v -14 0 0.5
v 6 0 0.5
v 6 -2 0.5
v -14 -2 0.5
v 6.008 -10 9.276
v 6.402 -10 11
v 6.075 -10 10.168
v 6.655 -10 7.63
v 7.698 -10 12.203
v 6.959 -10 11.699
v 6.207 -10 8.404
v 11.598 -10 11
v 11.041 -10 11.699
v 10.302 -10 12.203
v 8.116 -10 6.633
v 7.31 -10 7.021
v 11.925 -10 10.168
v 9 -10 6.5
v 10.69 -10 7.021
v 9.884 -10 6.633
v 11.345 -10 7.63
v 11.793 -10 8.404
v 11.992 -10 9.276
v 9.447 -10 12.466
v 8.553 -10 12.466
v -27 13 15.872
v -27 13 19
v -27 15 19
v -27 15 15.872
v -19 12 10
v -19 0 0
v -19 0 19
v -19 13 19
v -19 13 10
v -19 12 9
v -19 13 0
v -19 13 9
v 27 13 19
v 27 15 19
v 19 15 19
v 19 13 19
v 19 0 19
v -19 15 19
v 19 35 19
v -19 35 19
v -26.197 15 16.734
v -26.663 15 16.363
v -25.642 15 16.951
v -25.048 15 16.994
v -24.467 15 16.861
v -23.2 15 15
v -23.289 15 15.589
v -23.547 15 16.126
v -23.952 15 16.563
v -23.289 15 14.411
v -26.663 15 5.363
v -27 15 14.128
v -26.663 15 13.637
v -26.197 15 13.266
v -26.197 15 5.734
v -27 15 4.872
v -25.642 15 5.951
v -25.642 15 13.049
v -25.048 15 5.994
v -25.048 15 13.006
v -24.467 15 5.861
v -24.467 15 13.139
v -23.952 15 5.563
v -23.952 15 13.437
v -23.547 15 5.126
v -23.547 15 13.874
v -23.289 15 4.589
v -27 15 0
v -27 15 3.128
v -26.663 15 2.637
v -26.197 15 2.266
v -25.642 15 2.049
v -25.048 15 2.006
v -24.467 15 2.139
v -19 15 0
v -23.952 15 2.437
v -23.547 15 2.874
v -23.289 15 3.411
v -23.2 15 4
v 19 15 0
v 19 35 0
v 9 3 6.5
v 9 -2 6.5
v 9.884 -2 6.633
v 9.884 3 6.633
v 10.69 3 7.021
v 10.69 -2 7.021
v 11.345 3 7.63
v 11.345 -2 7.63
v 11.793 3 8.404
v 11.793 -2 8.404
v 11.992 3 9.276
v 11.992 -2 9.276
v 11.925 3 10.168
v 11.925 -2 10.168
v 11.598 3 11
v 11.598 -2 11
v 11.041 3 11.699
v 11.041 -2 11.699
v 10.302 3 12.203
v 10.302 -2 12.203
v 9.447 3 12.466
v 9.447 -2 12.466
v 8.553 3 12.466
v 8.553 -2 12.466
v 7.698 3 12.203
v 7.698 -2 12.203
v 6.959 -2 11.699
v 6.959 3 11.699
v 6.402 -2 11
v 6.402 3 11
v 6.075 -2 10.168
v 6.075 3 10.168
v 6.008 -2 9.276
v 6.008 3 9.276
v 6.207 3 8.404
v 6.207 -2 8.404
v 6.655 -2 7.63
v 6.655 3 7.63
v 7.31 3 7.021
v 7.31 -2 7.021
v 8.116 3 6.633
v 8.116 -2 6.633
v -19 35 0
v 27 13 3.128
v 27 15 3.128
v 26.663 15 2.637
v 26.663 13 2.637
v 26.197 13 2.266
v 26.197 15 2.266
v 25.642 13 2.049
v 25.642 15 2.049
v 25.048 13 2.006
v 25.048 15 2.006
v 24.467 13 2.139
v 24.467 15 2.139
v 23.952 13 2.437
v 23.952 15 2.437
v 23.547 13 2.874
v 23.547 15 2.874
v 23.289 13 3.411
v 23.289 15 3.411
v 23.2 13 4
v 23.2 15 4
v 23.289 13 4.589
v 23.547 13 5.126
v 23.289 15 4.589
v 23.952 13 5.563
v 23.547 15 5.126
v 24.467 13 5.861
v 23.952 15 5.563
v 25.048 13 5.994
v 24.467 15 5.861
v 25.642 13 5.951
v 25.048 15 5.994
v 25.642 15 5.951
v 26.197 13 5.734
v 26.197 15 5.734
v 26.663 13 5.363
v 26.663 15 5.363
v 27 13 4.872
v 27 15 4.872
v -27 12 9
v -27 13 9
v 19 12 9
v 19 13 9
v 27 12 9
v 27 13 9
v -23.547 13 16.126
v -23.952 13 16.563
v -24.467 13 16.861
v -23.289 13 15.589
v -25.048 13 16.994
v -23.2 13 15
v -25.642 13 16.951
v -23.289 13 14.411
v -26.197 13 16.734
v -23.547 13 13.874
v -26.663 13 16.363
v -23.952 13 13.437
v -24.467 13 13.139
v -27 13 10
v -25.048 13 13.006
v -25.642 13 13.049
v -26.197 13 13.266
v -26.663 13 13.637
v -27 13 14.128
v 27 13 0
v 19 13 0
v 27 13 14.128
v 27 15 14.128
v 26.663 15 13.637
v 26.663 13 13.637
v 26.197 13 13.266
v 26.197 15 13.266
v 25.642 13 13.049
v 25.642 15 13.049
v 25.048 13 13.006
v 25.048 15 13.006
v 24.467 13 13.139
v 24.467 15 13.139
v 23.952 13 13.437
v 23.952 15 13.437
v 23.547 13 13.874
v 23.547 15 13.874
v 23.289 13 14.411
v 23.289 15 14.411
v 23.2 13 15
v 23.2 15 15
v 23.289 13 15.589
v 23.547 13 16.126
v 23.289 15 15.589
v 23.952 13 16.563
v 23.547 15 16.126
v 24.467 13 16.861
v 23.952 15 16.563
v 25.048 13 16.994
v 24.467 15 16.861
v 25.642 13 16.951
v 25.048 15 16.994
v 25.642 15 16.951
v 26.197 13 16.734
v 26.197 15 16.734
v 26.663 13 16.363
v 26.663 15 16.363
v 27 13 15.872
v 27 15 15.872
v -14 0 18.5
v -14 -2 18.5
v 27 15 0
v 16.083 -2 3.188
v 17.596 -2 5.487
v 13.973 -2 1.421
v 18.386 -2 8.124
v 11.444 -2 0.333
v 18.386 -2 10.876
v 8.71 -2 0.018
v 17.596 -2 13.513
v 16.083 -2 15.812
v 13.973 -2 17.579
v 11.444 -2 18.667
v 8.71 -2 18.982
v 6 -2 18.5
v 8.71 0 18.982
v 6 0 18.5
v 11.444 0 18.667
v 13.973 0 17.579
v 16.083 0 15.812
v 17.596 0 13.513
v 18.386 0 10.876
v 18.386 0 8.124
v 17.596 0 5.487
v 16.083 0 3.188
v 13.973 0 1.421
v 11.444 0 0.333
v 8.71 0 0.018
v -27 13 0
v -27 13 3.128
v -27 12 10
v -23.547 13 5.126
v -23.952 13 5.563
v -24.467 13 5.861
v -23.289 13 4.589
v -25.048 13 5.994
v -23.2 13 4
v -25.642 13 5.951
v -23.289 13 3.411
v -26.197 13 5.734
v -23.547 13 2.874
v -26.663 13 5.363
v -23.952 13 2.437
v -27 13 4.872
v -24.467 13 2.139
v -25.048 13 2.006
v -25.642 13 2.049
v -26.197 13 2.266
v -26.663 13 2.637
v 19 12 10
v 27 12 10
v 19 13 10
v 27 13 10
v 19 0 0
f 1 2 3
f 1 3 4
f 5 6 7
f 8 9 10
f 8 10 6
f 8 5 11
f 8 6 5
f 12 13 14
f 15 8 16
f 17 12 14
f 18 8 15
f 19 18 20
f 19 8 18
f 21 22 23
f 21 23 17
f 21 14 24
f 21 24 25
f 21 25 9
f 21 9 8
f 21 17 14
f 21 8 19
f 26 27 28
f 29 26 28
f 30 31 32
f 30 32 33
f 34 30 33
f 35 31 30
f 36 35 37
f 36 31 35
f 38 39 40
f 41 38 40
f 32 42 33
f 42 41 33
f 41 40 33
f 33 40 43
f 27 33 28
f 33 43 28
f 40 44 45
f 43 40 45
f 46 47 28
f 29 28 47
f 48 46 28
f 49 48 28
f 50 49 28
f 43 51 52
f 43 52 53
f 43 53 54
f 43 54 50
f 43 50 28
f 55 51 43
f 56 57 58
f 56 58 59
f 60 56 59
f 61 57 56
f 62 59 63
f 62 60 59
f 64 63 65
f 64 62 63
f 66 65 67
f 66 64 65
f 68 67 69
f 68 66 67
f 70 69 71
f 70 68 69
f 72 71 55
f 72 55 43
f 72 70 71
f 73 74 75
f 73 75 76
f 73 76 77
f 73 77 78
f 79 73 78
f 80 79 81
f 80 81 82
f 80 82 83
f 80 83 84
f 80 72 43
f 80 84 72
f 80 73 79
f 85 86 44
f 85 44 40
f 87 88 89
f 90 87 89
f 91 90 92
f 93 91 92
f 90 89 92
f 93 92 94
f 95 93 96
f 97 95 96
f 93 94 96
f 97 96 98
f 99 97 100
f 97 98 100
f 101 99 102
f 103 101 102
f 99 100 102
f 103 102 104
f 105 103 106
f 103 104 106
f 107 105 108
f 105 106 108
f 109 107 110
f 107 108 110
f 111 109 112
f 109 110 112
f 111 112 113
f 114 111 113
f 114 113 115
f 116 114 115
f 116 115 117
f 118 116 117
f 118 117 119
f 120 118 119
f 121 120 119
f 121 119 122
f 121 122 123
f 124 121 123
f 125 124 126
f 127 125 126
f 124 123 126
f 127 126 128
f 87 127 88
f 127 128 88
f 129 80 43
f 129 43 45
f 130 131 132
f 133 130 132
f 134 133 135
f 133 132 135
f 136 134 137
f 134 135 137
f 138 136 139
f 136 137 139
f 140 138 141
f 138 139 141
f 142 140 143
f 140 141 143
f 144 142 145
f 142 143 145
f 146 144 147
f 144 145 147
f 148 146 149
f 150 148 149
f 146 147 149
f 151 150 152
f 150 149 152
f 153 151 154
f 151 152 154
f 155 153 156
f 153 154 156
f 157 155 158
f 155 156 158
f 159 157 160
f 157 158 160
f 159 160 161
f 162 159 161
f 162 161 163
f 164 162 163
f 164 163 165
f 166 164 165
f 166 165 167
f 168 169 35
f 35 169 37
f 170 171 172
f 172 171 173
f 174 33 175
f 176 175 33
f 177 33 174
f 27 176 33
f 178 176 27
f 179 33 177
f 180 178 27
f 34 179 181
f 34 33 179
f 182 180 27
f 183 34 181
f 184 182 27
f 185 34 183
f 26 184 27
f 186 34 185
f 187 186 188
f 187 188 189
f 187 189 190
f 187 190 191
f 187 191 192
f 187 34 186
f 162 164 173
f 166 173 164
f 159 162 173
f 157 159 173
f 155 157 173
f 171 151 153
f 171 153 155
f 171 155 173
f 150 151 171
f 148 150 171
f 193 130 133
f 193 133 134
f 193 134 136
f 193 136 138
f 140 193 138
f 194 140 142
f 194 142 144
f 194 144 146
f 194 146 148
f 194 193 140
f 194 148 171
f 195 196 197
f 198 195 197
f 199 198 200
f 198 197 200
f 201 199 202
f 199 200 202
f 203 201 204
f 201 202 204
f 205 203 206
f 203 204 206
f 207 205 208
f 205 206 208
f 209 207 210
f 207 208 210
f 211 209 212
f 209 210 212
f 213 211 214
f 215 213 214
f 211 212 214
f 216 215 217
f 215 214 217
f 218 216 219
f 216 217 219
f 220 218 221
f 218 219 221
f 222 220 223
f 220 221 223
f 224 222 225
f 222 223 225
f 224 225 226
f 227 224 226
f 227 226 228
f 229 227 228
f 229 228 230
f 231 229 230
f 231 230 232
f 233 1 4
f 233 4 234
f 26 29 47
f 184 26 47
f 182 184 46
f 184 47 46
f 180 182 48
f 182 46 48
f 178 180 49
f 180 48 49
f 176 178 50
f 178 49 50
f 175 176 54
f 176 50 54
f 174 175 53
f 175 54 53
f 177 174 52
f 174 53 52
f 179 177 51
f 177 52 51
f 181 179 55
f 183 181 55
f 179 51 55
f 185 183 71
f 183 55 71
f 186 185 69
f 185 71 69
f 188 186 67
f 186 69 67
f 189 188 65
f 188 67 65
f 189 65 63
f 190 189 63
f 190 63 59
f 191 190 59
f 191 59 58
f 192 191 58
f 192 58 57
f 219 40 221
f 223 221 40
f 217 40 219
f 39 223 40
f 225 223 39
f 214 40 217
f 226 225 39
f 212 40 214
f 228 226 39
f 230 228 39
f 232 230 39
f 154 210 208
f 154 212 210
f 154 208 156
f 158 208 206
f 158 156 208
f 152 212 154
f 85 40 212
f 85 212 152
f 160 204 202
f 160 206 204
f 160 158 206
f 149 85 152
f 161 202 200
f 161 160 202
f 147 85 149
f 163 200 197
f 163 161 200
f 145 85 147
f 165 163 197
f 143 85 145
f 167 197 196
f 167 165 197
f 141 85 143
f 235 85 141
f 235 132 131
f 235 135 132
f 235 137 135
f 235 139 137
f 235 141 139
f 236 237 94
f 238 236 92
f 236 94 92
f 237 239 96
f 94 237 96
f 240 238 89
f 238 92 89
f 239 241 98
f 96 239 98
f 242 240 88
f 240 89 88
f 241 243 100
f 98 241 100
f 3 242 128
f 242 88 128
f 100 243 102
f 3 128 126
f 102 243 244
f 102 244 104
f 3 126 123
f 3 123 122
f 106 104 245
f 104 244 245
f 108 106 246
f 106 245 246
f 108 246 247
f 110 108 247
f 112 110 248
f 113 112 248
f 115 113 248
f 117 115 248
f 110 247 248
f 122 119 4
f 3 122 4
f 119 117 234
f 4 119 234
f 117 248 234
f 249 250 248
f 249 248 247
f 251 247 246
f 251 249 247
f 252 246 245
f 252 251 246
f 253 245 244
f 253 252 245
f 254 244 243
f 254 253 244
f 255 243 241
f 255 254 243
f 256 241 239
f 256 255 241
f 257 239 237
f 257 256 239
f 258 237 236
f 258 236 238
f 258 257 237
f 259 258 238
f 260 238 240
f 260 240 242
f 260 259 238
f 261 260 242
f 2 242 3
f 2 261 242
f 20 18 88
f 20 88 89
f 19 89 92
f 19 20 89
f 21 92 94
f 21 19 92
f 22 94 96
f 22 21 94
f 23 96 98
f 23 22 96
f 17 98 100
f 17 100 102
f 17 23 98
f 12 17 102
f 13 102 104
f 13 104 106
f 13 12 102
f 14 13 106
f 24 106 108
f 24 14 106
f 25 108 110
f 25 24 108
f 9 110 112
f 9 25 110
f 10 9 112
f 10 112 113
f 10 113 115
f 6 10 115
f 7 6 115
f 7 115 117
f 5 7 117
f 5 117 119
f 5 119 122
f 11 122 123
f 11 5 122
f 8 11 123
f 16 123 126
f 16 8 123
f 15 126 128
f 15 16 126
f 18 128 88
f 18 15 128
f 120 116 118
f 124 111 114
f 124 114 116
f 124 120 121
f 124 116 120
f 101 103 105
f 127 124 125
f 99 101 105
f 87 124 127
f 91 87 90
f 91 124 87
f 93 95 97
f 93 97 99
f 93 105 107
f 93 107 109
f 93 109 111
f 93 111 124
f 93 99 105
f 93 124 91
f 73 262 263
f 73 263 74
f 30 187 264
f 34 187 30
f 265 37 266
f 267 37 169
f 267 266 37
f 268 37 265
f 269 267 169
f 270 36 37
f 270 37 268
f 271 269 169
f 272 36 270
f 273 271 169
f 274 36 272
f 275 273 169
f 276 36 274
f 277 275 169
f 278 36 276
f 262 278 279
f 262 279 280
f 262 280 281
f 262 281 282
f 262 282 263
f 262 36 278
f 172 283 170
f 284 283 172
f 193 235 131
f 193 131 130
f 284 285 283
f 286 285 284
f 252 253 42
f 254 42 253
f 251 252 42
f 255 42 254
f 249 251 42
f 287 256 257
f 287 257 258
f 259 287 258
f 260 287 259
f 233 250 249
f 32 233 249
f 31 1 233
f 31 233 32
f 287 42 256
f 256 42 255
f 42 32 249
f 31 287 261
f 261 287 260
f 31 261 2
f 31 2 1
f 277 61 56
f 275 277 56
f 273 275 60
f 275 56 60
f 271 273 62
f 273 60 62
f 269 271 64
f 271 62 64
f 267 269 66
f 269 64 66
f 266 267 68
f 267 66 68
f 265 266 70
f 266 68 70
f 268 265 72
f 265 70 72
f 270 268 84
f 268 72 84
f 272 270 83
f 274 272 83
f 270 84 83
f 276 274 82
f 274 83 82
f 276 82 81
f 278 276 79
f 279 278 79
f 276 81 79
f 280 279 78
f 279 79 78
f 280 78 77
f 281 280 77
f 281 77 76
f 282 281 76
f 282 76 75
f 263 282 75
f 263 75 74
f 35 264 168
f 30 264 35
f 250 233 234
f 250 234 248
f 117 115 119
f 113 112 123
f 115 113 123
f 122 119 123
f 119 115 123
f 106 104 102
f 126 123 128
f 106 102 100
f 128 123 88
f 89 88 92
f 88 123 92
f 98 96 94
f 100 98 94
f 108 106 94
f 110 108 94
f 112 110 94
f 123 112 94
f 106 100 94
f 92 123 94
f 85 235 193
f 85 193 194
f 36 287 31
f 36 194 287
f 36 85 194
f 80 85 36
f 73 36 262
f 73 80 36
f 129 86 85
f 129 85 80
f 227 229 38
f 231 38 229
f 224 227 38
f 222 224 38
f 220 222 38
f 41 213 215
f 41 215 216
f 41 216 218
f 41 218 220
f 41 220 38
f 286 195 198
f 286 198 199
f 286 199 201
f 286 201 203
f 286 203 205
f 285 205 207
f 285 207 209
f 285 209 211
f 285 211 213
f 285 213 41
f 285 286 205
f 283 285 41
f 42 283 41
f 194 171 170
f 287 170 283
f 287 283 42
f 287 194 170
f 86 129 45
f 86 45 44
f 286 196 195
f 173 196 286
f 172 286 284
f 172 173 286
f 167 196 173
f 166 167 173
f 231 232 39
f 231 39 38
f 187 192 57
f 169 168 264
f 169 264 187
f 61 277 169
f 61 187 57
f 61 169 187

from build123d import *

# Parameters (mm, degrees)
BOSS_EXTRUDE1_DEPTH  = 19
SKETCH6_R            = 2
CUT_EXTRUDE2_DEPTH   = 39.600518131
SKETCH10_W           = 8
SKETCH10_H           = 1
BOSS_EXTRUDE14_DEPTH = 1
BOSS_EXTRUDE15_DEPTH = 2
SKETCH13_R           = 3
CUT_EXTRUDE3_DEPTH   = 5
BOSS_EXTRUDE16_START = 8
SKETCH15_R           = 3
BOSS_EXTRUDE16_DEPTH = 8


with BuildPart() as part:
    # Sketch1 → Boss-Extrude1 (new body)
    with BuildSketch(Plane.XY):
        Polygon((19, 0), (-19, 0), (-19, 13), (-27, 13), (-27, 15), (-19, 15), (-19, 35), (19, 35), (19, 15), (27, 15), (27, 13), (19, 13), align=None)
    extrude(amount=BOSS_EXTRUDE1_DEPTH)

    # Sketch6 → Cut-Extrude2 (cut, through all)
    with BuildSketch(Plane(origin=(0, 15, 0), x_dir=(1, 0, 0), z_dir=(0, 1, 0))):
        with Locations((25.2, -15)):
            Circle(SKETCH6_R)
        with Locations((25.2, -4)):
            Circle(SKETCH6_R)
        with Locations((-25.2, -4)):
            Circle(SKETCH6_R)
        with Locations((-25.2, -15)):
            Circle(SKETCH6_R)
    extrude(amount=-CUT_EXTRUDE2_DEPTH, mode=Mode.SUBTRACT)

    # Sketch10 → Boss-Extrude14 (add)
    with BuildSketch(Plane.XZ.offset(-13)):
        with Locations((-23, 9.5)):
            Rectangle(SKETCH10_W, SKETCH10_H)
        with Locations((23, 9.5)):
            Rectangle(SKETCH10_W, SKETCH10_H)
    extrude(amount=BOSS_EXTRUDE14_DEPTH)

    # Sketch12 → Boss-Extrude15 (add)
    with BuildSketch(Plane.XZ):
        with BuildLine():
            Line((-14, 18.5), (6, 18.5))
            ThreePointArc((6, 18.5), (18.486832981, 9.5), (6, 0.5))
            Line((6, 0.5), (-14, 0.5))
            Line((-14, 0.5), (-14, 18.5))
        make_face()
    extrude(amount=BOSS_EXTRUDE15_DEPTH)

    # Sketch13 → Cut-Extrude3 (cut)
    with BuildSketch(Plane.XZ.offset(2)):
        with Locations(Location((9, 9.5, 0), (0, 0, 270))):
            Circle(SKETCH13_R)
    extrude(amount=-CUT_EXTRUDE3_DEPTH, mode=Mode.SUBTRACT)


with BuildPart() as body_2:
    # Sketch15 → Boss-Extrude16 (new body)
    with BuildSketch(Plane.XZ.offset(2).offset(BOSS_EXTRUDE16_START)):
        with Locations(Location((9, 9.5, 0), (0, 0, 270))):
            Circle(SKETCH15_R)
    extrude(amount=-BOSS_EXTRUDE16_DEPTH)


solid = Compound([part.part, body_2.part])
